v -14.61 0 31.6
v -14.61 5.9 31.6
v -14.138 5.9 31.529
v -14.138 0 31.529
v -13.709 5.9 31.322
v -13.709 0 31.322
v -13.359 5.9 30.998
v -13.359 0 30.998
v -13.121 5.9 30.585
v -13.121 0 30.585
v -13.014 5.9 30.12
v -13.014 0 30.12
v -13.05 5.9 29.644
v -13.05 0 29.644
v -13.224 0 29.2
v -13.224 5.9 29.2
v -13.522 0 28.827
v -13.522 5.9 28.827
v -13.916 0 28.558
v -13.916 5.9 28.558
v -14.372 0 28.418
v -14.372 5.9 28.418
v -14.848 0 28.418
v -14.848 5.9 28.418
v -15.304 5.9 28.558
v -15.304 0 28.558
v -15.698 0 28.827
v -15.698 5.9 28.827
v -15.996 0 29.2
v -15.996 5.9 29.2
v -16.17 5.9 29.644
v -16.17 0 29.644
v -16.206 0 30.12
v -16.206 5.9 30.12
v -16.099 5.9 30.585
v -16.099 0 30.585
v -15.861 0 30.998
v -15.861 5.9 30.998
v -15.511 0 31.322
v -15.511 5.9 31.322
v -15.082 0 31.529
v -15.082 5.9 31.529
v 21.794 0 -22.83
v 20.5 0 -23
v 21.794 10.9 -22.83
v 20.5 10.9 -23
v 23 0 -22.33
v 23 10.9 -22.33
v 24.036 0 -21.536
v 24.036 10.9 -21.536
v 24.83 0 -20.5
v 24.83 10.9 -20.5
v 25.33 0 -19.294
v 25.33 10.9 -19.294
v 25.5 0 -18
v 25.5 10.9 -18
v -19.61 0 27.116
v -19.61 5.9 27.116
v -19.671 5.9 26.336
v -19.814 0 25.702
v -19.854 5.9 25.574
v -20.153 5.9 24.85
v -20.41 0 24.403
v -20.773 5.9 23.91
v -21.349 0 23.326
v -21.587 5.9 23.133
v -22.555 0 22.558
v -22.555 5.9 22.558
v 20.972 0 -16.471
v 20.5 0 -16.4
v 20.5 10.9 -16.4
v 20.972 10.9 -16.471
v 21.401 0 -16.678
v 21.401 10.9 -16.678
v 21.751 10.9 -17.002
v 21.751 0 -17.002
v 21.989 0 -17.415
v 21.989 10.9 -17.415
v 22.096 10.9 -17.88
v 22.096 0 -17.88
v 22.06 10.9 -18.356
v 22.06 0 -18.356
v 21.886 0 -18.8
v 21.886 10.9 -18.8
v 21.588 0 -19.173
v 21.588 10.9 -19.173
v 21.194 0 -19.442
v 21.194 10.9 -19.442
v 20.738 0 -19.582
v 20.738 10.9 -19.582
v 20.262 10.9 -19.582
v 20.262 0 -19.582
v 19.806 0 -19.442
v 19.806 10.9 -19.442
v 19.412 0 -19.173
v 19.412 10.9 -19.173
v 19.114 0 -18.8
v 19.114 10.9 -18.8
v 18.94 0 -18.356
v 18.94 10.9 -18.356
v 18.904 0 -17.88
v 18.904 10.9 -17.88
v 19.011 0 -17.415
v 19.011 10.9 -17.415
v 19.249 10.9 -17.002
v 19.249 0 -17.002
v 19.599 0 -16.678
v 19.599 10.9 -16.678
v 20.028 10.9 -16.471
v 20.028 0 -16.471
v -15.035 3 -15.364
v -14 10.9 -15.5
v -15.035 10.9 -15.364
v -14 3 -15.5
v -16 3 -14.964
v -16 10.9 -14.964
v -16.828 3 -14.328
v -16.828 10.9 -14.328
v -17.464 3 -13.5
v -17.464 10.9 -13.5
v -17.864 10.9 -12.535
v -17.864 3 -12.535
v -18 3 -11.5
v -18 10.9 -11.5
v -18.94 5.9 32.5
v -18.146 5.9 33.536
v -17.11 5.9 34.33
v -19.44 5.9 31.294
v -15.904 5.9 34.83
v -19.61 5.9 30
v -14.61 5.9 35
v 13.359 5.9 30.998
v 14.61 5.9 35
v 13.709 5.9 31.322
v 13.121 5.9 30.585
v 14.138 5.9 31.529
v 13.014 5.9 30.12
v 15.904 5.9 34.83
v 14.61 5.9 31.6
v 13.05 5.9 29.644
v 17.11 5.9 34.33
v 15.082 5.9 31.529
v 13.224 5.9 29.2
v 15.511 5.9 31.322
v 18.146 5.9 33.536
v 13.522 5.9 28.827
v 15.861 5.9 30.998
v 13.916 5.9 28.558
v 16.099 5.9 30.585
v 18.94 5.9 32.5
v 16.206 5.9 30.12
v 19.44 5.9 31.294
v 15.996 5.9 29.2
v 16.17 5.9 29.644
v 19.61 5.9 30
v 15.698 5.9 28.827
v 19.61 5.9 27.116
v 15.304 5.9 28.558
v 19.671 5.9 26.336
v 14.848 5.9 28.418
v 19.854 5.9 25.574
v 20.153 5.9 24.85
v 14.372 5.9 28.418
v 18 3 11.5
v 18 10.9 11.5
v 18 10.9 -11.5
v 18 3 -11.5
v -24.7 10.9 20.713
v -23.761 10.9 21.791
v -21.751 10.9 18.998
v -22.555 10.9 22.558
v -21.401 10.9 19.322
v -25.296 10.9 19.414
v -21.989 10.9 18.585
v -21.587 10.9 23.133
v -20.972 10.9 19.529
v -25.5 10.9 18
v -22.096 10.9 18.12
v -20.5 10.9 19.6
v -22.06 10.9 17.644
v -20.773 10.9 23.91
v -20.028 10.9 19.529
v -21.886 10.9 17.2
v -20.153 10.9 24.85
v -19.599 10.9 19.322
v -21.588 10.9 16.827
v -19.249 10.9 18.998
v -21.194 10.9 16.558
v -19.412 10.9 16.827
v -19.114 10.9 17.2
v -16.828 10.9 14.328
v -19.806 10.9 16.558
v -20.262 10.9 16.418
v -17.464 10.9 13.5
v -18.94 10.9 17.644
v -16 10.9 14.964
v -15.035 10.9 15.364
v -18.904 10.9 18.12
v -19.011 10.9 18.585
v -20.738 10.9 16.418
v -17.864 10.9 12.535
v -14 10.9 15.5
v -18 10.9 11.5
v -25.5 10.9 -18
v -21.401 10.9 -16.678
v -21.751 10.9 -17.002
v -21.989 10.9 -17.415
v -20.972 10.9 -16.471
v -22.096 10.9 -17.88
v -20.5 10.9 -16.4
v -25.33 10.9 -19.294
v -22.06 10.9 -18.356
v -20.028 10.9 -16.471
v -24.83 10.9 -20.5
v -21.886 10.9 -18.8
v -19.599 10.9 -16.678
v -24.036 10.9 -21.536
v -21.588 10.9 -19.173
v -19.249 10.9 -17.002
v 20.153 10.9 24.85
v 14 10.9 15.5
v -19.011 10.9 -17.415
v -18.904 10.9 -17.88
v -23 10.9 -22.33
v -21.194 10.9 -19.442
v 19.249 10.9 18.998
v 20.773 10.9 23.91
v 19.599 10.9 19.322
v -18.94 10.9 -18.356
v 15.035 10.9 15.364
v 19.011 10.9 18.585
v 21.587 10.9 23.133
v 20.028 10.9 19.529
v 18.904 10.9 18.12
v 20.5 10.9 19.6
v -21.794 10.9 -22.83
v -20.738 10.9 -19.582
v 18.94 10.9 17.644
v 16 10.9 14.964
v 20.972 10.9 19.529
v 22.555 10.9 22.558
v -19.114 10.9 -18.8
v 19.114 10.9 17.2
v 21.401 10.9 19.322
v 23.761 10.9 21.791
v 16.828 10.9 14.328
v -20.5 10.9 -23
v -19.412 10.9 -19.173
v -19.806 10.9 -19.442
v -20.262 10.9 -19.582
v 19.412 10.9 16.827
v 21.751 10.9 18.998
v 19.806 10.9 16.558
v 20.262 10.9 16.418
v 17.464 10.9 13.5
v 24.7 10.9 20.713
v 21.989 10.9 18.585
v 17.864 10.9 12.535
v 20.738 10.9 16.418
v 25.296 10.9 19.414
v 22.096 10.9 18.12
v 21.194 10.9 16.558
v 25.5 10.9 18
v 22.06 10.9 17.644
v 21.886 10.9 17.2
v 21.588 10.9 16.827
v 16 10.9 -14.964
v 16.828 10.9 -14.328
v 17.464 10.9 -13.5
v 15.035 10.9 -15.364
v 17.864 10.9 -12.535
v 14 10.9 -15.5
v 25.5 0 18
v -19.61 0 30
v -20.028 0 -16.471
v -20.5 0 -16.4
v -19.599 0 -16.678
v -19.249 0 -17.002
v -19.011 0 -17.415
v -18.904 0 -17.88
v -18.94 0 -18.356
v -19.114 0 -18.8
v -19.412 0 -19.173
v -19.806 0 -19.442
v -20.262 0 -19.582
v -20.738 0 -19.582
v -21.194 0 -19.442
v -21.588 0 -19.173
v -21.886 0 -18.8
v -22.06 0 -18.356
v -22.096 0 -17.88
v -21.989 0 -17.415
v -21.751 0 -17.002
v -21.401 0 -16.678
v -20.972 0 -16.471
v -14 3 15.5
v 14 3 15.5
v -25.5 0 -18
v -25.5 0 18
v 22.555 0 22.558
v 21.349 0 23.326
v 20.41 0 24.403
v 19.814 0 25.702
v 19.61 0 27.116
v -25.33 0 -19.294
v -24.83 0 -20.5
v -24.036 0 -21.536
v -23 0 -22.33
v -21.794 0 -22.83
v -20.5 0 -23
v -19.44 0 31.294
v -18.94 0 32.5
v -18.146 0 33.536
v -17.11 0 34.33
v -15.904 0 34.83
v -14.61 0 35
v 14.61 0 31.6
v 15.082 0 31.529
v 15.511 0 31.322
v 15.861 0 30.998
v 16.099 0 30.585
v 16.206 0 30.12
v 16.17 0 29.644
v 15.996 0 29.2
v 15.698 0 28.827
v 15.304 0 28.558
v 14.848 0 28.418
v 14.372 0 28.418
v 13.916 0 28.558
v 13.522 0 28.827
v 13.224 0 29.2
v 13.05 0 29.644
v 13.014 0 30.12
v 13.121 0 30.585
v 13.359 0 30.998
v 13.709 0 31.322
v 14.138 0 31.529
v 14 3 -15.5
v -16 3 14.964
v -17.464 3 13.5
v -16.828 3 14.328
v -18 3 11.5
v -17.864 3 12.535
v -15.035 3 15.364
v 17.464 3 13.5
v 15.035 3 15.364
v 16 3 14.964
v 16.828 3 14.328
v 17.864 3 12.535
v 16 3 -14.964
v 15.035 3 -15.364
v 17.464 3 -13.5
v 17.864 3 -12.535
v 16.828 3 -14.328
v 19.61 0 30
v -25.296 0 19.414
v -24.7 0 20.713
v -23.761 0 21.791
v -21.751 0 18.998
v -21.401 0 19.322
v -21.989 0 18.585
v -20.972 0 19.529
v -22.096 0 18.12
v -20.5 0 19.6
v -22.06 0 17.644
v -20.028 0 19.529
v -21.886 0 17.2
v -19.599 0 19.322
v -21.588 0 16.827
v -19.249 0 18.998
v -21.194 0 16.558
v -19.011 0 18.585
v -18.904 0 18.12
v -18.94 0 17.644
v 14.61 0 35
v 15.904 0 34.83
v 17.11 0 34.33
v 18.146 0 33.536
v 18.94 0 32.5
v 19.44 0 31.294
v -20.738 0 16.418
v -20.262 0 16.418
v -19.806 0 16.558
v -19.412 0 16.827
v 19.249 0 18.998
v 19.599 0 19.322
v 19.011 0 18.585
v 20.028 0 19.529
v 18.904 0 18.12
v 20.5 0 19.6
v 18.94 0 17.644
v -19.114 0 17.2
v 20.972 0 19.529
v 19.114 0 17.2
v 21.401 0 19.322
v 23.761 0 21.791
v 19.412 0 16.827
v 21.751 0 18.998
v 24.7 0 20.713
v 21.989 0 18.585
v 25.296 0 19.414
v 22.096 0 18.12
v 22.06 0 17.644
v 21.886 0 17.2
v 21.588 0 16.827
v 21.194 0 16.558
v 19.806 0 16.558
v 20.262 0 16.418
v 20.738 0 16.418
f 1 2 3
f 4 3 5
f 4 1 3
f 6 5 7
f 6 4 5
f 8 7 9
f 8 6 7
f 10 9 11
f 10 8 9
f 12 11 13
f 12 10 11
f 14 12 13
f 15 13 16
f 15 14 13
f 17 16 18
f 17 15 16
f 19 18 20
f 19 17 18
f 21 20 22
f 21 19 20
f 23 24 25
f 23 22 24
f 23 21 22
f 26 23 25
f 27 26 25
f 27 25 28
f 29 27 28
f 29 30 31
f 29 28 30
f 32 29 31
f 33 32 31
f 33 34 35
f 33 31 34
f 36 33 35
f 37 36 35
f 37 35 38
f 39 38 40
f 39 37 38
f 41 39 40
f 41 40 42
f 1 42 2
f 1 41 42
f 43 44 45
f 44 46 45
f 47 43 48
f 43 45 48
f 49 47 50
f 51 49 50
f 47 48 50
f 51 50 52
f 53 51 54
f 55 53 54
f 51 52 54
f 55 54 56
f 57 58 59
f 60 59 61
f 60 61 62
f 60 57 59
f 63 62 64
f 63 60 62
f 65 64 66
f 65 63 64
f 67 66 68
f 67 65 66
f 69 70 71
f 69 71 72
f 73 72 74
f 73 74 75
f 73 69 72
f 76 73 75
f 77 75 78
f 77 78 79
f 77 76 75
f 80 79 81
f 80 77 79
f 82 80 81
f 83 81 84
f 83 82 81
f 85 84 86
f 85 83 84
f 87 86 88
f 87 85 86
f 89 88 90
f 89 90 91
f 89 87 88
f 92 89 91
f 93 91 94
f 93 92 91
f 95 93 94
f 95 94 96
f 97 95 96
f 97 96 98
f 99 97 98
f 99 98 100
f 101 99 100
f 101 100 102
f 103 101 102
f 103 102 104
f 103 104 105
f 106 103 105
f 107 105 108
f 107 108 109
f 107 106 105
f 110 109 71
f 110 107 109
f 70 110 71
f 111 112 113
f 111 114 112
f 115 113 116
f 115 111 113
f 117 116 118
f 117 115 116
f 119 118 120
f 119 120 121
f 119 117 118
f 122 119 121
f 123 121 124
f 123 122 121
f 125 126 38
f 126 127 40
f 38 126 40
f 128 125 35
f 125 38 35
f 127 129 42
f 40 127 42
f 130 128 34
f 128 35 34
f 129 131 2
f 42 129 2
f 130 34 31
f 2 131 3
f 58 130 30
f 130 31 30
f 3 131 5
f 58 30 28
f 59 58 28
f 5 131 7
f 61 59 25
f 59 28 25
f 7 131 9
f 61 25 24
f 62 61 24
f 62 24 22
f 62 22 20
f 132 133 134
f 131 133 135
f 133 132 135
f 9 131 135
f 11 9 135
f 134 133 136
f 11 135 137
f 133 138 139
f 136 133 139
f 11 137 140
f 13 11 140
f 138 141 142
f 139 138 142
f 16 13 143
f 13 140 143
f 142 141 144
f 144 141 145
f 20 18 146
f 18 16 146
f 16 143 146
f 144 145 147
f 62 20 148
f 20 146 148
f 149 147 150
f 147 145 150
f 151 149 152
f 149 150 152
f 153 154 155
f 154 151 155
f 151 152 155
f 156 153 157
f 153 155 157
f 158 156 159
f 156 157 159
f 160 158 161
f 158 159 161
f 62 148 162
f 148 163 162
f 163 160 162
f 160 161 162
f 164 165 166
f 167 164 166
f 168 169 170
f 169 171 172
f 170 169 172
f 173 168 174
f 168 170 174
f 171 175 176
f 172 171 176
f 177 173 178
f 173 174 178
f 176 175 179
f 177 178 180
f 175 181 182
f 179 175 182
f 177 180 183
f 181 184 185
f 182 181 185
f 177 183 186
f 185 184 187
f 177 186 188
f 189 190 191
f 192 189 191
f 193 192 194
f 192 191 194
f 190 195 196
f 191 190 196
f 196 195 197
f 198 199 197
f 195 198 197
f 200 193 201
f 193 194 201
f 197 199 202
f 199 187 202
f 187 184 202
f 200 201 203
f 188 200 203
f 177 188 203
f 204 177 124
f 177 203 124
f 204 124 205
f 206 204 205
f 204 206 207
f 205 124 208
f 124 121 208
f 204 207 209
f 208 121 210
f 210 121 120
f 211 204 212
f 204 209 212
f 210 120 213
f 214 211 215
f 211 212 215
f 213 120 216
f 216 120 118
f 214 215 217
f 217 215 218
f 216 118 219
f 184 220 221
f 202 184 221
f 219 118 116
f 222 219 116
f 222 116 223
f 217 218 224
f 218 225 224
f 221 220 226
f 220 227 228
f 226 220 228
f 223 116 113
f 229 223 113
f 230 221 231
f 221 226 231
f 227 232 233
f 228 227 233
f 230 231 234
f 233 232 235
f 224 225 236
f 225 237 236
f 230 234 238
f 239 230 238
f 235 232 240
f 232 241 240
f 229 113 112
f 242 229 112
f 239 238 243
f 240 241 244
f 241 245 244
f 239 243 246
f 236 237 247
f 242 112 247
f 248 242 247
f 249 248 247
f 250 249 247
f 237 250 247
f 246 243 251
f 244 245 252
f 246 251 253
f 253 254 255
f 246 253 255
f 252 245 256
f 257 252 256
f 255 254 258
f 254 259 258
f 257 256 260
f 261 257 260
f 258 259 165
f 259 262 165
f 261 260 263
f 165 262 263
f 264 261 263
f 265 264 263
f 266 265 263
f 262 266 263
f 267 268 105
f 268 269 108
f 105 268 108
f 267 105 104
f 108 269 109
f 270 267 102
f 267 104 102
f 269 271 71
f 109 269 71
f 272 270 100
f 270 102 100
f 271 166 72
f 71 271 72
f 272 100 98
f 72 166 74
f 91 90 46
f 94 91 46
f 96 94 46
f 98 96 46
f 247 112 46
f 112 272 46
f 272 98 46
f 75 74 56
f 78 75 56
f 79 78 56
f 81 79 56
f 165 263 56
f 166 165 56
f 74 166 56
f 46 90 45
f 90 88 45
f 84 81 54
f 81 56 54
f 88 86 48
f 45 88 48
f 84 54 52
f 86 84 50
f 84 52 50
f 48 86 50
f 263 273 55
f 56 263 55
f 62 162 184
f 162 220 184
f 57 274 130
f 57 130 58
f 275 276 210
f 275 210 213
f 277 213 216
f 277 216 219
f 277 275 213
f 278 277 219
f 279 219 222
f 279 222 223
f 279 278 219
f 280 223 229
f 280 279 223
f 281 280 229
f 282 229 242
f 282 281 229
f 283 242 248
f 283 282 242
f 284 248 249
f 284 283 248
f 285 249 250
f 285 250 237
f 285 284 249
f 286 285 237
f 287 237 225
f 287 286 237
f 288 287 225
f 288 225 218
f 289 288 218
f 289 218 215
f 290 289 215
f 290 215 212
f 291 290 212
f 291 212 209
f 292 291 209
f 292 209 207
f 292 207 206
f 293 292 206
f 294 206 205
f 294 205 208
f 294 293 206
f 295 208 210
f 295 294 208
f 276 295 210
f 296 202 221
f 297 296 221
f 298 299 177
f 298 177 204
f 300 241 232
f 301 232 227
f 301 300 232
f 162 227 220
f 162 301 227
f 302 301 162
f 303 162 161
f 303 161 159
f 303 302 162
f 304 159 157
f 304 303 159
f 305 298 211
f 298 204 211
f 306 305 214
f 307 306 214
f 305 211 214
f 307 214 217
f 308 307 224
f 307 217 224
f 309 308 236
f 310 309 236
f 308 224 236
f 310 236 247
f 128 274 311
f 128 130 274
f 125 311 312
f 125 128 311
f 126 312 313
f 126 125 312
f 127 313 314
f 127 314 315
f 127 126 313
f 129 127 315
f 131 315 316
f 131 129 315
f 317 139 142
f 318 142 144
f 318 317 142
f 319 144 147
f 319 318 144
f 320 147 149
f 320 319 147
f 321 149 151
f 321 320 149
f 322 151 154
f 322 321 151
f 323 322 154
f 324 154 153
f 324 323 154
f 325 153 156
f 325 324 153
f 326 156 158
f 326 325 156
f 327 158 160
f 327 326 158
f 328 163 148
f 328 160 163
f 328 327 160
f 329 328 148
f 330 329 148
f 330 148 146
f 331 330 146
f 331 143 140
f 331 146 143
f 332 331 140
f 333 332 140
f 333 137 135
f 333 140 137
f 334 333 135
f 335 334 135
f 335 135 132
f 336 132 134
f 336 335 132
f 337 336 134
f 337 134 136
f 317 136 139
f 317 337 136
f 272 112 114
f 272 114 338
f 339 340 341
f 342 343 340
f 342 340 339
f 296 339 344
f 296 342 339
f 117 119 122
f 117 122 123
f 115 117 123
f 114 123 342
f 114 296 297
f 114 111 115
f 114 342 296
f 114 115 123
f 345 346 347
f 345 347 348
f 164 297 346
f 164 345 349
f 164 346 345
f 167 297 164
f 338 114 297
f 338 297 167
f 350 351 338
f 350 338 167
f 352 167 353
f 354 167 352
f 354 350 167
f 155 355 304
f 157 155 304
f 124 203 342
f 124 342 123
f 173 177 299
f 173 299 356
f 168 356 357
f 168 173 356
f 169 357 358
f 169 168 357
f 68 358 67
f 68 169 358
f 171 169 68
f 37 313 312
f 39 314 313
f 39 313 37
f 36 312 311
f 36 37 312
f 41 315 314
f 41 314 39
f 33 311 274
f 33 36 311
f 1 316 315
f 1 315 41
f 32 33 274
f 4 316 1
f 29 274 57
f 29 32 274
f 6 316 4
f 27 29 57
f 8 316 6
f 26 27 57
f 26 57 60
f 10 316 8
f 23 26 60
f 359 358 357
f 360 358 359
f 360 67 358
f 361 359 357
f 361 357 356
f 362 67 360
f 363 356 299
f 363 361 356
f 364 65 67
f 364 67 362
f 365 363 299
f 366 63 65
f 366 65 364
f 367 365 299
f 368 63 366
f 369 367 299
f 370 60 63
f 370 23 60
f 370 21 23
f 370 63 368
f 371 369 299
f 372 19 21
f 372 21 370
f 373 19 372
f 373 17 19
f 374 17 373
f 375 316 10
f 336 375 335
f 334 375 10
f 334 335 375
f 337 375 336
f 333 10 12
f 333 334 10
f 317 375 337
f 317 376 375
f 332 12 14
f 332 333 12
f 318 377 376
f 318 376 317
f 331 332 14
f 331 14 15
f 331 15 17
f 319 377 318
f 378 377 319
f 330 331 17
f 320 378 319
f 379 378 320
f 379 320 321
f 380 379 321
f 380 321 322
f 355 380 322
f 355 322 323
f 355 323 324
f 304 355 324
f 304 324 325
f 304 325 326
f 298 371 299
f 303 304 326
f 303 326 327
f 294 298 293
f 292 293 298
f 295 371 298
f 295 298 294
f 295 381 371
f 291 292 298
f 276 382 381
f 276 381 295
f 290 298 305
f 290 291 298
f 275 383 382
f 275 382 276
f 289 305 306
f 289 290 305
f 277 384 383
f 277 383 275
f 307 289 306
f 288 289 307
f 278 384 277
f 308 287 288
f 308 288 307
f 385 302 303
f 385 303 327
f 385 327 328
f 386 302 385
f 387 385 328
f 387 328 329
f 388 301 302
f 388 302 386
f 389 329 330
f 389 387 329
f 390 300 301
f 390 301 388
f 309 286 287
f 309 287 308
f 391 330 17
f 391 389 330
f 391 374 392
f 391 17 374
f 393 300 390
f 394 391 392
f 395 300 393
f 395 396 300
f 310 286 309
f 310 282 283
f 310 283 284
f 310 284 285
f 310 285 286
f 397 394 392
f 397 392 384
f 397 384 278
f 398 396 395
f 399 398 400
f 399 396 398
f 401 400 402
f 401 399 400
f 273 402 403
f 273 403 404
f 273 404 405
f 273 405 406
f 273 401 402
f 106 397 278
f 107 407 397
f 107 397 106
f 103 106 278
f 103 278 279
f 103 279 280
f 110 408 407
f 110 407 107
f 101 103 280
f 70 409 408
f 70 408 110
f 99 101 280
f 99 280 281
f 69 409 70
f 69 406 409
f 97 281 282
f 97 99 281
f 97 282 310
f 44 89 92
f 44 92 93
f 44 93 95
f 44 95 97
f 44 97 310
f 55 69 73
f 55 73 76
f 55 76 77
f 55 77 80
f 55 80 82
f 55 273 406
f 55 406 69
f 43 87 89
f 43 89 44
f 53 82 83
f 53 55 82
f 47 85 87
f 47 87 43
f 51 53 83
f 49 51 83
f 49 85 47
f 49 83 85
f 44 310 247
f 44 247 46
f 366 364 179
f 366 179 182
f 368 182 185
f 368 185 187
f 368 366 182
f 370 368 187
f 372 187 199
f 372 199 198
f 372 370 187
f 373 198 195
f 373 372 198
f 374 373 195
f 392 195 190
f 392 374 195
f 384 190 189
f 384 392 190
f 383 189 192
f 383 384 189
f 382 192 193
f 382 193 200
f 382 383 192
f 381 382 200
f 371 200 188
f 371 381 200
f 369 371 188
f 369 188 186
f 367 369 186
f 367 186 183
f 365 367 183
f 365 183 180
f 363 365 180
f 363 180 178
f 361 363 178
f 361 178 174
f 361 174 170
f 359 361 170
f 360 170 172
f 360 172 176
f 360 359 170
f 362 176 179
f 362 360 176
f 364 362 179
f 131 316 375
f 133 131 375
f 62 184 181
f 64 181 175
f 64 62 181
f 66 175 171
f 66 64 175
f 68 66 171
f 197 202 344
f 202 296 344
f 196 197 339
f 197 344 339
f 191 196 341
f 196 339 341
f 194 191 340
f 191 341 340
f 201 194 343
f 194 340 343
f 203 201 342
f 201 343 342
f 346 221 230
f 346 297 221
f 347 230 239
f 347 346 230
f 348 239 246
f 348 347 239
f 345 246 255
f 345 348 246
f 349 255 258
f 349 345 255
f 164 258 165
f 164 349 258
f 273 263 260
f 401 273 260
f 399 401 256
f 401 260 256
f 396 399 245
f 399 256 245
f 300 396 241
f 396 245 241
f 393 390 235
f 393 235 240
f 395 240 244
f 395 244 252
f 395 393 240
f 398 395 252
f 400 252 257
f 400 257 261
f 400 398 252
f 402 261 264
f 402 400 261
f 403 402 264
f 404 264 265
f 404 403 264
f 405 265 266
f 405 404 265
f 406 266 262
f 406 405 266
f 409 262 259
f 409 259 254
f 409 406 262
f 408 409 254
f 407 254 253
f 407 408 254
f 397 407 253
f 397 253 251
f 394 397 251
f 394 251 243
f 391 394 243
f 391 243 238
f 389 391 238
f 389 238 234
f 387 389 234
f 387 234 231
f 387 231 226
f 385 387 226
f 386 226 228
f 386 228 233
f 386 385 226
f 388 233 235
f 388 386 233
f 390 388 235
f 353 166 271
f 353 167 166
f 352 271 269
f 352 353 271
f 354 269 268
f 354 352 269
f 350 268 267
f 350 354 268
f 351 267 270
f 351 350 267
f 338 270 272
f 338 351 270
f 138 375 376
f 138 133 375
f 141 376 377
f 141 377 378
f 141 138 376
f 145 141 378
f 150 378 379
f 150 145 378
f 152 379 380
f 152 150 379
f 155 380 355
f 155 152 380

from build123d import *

# Parameters (mm, degrees)
SKETCH_1_W          = 51
SKETCH_1_H          = 46
SKETCH_1_R          = 1.6
SKETCH_1_W_2        = 39.22
SKETCH_1_H_2        = 12
EXTRUDE_1_DEPTH     = 10.9
SKETCH_2_W          = 39.22
SKETCH_2_H          = 10.3
CUT_EXTRUDE_1_DEPTH = 5
FILLET_1_R          = 5
SKETCH_3_W          = 36
SKETCH_3_H          = 31
CUT_EXTRUDE_2_DEPTH = 7.9
FILLET_3_R          = 4
FILLET_2_R          = 5


with BuildPart() as part:
    # ｽｹｯﾁ1 → ﾎﾞｽ - 押し出し1 (new body)
    # profile 1 of 2: a face of its own
    with BuildSketch(Plane(origin=(0, 0, 0), x_dir=(1, 0, 0), z_dir=(0, 1, 0))):
        Rectangle(SKETCH_1_W, SKETCH_1_H)
        with Locations(Location((-20.5, 18, 0), (0, 0, 270))):
            Circle(SKETCH_1_R, mode=Mode.SUBTRACT)
        with Locations(Location((20.5, 18, 0), (0, 0, 270))):
            Circle(SKETCH_1_R, mode=Mode.SUBTRACT)
        with Locations(Location((-20.5, -18, 0), (0, 0, 270))):
            Circle(SKETCH_1_R, mode=Mode.SUBTRACT)
        with Locations(Location((20.5, -18, 0), (0, 0, 270))):
            Circle(SKETCH_1_R, mode=Mode.SUBTRACT)
    # profile 2 of 2: a face of its own
    with BuildSketch(Plane(origin=(0, 0, 0), x_dir=(1, 0, 0), z_dir=(0, 1, 0))):
        with Locations((0, -29)):
            Rectangle(SKETCH_1_W_2, SKETCH_1_H_2)
        with Locations(Location((-14.61, -30, 0), (0, 0, 270))):
            Circle(SKETCH_1_R, mode=Mode.SUBTRACT)
        with Locations(Location((14.61, -30, 0), (0, 0, 270))):
            Circle(SKETCH_1_R, mode=Mode.SUBTRACT)
    extrude(amount=EXTRUDE_1_DEPTH)

    # ｽｹｯﾁ2 → ｶｯﾄ - 押し出し1 (cut)
    with BuildSketch(Plane(origin=(0, 10.9, 0), x_dir=(1, 0, 0), z_dir=(0, 1, 0))):
        with Locations((0, -30)):
            Rectangle(SKETCH_2_W, SKETCH_2_H)
    extrude(amount=-CUT_EXTRUDE_1_DEPTH, mode=Mode.SUBTRACT)

    # ﾌｨﾚｯﾄ1
    fillet_1_edges = [part.edges().sort_by_distance(p)[0] for p in [
        (-25.5, 5.45, 23),
        (-25.5, 5.45, -23),
        (25.5, 5.45, -23),
        (25.5, 5.45, 23),
        (19.61, 2.95, 35),
        (-19.61, 2.95, 35),
    ]]
    fillet(fillet_1_edges, radius=FILLET_1_R)

    # ｽｹｯﾁ3 → ｶｯﾄ - 押し出し2 (cut)
    with BuildSketch(Plane(origin=(0, 10.9, 0), x_dir=(1, 0, 0), z_dir=(0, 1, 0))):
        Rectangle(SKETCH_3_W, SKETCH_3_H)
    extrude(amount=-CUT_EXTRUDE_2_DEPTH, mode=Mode.SUBTRACT)

    # ﾌｨﾚｯﾄ3
    fillet_3_edges = [part.edges().sort_by_distance(p)[0] for p in [
        (18, 6.95, -15.5),
        (18, 6.95, 15.5),
        (-18, 6.95, 15.5),
        (-18, 6.95, -15.5),
    ]]
    fillet(fillet_3_edges, radius=FILLET_3_R)

    # ﾌｨﾚｯﾄ2
    # the kernel refuses this fillet: 5 mm, written as the material it adds along each edge
    with BuildSketch(Plane(origin=(-19.61, 0, 23), x_dir=(-0.9889327426199618, 0, -0.14836451925632577), z_dir=(0, 1, 0))) as fillet_2_piece_1_section:
        with BuildLine():
            CenterArc((4.333942914, 4.812619291), FILLET_2_R, 188.532159938, 65.732331269)
            Line((-0.610720799, 4.070796695), (-1.10518717, 3.996614435))
            Line((-1.10518717, 3.996614435), (-0.494466371, -0.07418226))
            Line((-0.494466371, -0.07418226), (0.07418226, -0.494466371))
            ThreePointArc((0.07418226, -0.494466371), (0.954332401, -0.362421949), (2.842359317, -0.481261929))
            Line((2.842359317, -0.481261929), (2.977957826, 0))
        make_face()
    fillet_2_piece_1 = extrude(amount=10.9, mode=Mode.PRIVATE)
    fillet_2_piece_1 = split(fillet_2_piece_1, bisect_by=Plane(origin=(-20.366453669, 5.9, 23.394752077), z_dir=(0, -1, 0)), keep=Keep.TOP, mode=Mode.PRIVATE)
    fillet_2_piece_1 = split(fillet_2_piece_1, bisect_by=Plane(origin=(-20.366453669, 2.95, 24.85), z_dir=(0, 0, -1)), keep=Keep.TOP, mode=Mode.PRIVATE)
    add(fillet_2_piece_1)
    with BuildSketch(Plane(origin=(-19.61, 0, 23), x_dir=(-0.9889327426199618, 0, -0.14836451925632577), z_dir=(0, 1, 0))) as fillet_2_piece_2_section:
        with BuildLine():
            CenterArc((4.333942914, 4.812619291), FILLET_2_R, 188.532159938, 65.732331269)
            Line((-0.610720799, 4.070796695), (-1.10518717, 3.996614435))
            Line((-1.10518717, 3.996614435), (-0.494466371, -0.07418226))
            Line((-0.494466371, -0.07418226), (0.07418226, -0.494466371))
            ThreePointArc((0.07418226, -0.494466371), (0.954332401, -0.362421949), (2.842359317, -0.481261929))
            Line((2.842359317, -0.481261929), (2.977957826, 0))
        make_face()
    fillet_2_piece_2 = extrude(amount=10.9, mode=Mode.PRIVATE)
    fillet_2_piece_2 = split(fillet_2_piece_2, bisect_by=Plane(origin=(-19.467497884, 5.9, 25.833436825), z_dir=(0, -1, 0)), keep=Keep.TOP, mode=Mode.PRIVATE)
    fillet_2_piece_2 = split(fillet_2_piece_2, bisect_by=Plane(origin=(-19.467497884, 2.95, 24.85), z_dir=(0, 0, 1)), keep=Keep.TOP, mode=Mode.PRIVATE)
    add(fillet_2_piece_2)
    with BuildSketch(Plane(origin=(-19.61, 0, 23), x_dir=(-0.9889327426199618, 0, -0.14836451925632577), z_dir=(0, 1, 0))) as fillet_2_piece_3_section:
        with BuildLine():
            CenterArc((4.333942914, 4.812619291), FILLET_2_R, 188.532159938, 65.732331269)
            Line((-0.610720799, 4.070796695), (-1.10518717, 3.996614435))
            Line((-1.10518717, 3.996614435), (-0.494466371, -0.07418226))
            Line((-0.494466371, -0.07418226), (0.07418226, -0.494466371))
            ThreePointArc((0.07418226, -0.494466371), (0.954332401, -0.362421949), (2.842359317, -0.481261929))
            Line((2.842359317, -0.481261929), (2.977957826, 0))
        make_face()
    fillet_2_piece_3 = extrude(amount=10.9, mode=Mode.PRIVATE)
    fillet_2_piece_3 = split(fillet_2_piece_3, bisect_by=Plane(origin=(-20.366453669, 5.9, 23.394752077), z_dir=(0, 1, 0)), keep=Keep.TOP, mode=Mode.PRIVATE)
    fillet_2_piece_3 = split(fillet_2_piece_3, bisect_by=Plane(origin=(-20.366453669, 8.4, 24.85), z_dir=(0, 0, -1)), keep=Keep.TOP, mode=Mode.PRIVATE)
    add(fillet_2_piece_3)
    with BuildSketch(Plane(origin=(19.61, 0, 23), x_dir=(0, 0, 1), z_dir=(0, 1, 0))) as fillet_2_piece_4_section:
        with BuildLine():
            CenterArc((4.116353438, 5), FILLET_2_R, 204.267668731, 65.732331269)
            Line((-0.441823281, 2.945), (-0.897640953, 2.7395))
            ThreePointArc((-0.897640953, 2.7395), (-0.5, 0.89), (-0.5, 0))
            Line((-0.5, 0), (0, -0.5))
            Line((0, -0.5), (4.116353438, -0.5))
            Line((4.116353438, -0.5), (4.116353438, 0))
        make_face()
    fillet_2_piece_4 = extrude(amount=10.9, mode=Mode.PRIVATE)
    fillet_2_piece_4 = split(fillet_2_piece_4, bisect_by=Plane(origin=(19.467497884, 2.95, 24.85), z_dir=(0, 0, 1)), keep=Keep.TOP, mode=Mode.PRIVATE)
    fillet_2_piece_4 = split(fillet_2_piece_4, bisect_by=Plane(origin=(19.467497884, 5.9, 25.833436825), z_dir=(0, -1, 0)), keep=Keep.TOP, mode=Mode.PRIVATE)
    add(fillet_2_piece_4)
    with BuildSketch(Plane(origin=(19.61, 0, 23), x_dir=(0, 0, 1), z_dir=(0, 1, 0))) as fillet_2_piece_5_section:
        with BuildLine():
            CenterArc((4.116353438, 5), FILLET_2_R, 204.267668731, 65.732331269)
            Line((-0.441823281, 2.945), (-0.897640953, 2.7395))
            ThreePointArc((-0.897640953, 2.7395), (-0.5, 0.89), (-0.5, 0))
            Line((-0.5, 0), (0, -0.5))
            Line((0, -0.5), (4.116353438, -0.5))
            Line((4.116353438, -0.5), (4.116353438, 0))
        make_face()
    fillet_2_piece_5 = extrude(amount=10.9, mode=Mode.PRIVATE)
    fillet_2_piece_5 = split(fillet_2_piece_5, bisect_by=Plane(origin=(20.366453669, 2.95, 24.85), z_dir=(0, 0, -1)), keep=Keep.TOP, mode=Mode.PRIVATE)
    fillet_2_piece_5 = split(fillet_2_piece_5, bisect_by=Plane(origin=(20.366453669, 5.9, 23.394752077), z_dir=(0, -1, 0)), keep=Keep.TOP, mode=Mode.PRIVATE)
    add(fillet_2_piece_5)
    with BuildSketch(Plane(origin=(19.61, 0, 23), x_dir=(0, 0, 1), z_dir=(0, 1, 0))) as fillet_2_piece_6_section:
        with BuildLine():
            CenterArc((4.116353438, 5), FILLET_2_R, 204.267668731, 65.732331269)
            Line((-0.441823281, 2.945), (-0.897640953, 2.7395))
            ThreePointArc((-0.897640953, 2.7395), (-0.5, 0.89), (-0.5, 0))
            Line((-0.5, 0), (0, -0.5))
            Line((0, -0.5), (4.116353438, -0.5))
            Line((4.116353438, -0.5), (4.116353438, 0))
        make_face()
    fillet_2_piece_6 = extrude(amount=10.9, mode=Mode.PRIVATE)
    fillet_2_piece_6 = split(fillet_2_piece_6, bisect_by=Plane(origin=(20.366453669, 8.4, 24.85), z_dir=(0, 0, -1)), keep=Keep.TOP, mode=Mode.PRIVATE)
    fillet_2_piece_6 = split(fillet_2_piece_6, bisect_by=Plane(origin=(20.366453669, 5.9, 23.394752077), z_dir=(0, 1, 0)), keep=Keep.TOP, mode=Mode.PRIVATE)
    add(fillet_2_piece_6)


solid = part.part
